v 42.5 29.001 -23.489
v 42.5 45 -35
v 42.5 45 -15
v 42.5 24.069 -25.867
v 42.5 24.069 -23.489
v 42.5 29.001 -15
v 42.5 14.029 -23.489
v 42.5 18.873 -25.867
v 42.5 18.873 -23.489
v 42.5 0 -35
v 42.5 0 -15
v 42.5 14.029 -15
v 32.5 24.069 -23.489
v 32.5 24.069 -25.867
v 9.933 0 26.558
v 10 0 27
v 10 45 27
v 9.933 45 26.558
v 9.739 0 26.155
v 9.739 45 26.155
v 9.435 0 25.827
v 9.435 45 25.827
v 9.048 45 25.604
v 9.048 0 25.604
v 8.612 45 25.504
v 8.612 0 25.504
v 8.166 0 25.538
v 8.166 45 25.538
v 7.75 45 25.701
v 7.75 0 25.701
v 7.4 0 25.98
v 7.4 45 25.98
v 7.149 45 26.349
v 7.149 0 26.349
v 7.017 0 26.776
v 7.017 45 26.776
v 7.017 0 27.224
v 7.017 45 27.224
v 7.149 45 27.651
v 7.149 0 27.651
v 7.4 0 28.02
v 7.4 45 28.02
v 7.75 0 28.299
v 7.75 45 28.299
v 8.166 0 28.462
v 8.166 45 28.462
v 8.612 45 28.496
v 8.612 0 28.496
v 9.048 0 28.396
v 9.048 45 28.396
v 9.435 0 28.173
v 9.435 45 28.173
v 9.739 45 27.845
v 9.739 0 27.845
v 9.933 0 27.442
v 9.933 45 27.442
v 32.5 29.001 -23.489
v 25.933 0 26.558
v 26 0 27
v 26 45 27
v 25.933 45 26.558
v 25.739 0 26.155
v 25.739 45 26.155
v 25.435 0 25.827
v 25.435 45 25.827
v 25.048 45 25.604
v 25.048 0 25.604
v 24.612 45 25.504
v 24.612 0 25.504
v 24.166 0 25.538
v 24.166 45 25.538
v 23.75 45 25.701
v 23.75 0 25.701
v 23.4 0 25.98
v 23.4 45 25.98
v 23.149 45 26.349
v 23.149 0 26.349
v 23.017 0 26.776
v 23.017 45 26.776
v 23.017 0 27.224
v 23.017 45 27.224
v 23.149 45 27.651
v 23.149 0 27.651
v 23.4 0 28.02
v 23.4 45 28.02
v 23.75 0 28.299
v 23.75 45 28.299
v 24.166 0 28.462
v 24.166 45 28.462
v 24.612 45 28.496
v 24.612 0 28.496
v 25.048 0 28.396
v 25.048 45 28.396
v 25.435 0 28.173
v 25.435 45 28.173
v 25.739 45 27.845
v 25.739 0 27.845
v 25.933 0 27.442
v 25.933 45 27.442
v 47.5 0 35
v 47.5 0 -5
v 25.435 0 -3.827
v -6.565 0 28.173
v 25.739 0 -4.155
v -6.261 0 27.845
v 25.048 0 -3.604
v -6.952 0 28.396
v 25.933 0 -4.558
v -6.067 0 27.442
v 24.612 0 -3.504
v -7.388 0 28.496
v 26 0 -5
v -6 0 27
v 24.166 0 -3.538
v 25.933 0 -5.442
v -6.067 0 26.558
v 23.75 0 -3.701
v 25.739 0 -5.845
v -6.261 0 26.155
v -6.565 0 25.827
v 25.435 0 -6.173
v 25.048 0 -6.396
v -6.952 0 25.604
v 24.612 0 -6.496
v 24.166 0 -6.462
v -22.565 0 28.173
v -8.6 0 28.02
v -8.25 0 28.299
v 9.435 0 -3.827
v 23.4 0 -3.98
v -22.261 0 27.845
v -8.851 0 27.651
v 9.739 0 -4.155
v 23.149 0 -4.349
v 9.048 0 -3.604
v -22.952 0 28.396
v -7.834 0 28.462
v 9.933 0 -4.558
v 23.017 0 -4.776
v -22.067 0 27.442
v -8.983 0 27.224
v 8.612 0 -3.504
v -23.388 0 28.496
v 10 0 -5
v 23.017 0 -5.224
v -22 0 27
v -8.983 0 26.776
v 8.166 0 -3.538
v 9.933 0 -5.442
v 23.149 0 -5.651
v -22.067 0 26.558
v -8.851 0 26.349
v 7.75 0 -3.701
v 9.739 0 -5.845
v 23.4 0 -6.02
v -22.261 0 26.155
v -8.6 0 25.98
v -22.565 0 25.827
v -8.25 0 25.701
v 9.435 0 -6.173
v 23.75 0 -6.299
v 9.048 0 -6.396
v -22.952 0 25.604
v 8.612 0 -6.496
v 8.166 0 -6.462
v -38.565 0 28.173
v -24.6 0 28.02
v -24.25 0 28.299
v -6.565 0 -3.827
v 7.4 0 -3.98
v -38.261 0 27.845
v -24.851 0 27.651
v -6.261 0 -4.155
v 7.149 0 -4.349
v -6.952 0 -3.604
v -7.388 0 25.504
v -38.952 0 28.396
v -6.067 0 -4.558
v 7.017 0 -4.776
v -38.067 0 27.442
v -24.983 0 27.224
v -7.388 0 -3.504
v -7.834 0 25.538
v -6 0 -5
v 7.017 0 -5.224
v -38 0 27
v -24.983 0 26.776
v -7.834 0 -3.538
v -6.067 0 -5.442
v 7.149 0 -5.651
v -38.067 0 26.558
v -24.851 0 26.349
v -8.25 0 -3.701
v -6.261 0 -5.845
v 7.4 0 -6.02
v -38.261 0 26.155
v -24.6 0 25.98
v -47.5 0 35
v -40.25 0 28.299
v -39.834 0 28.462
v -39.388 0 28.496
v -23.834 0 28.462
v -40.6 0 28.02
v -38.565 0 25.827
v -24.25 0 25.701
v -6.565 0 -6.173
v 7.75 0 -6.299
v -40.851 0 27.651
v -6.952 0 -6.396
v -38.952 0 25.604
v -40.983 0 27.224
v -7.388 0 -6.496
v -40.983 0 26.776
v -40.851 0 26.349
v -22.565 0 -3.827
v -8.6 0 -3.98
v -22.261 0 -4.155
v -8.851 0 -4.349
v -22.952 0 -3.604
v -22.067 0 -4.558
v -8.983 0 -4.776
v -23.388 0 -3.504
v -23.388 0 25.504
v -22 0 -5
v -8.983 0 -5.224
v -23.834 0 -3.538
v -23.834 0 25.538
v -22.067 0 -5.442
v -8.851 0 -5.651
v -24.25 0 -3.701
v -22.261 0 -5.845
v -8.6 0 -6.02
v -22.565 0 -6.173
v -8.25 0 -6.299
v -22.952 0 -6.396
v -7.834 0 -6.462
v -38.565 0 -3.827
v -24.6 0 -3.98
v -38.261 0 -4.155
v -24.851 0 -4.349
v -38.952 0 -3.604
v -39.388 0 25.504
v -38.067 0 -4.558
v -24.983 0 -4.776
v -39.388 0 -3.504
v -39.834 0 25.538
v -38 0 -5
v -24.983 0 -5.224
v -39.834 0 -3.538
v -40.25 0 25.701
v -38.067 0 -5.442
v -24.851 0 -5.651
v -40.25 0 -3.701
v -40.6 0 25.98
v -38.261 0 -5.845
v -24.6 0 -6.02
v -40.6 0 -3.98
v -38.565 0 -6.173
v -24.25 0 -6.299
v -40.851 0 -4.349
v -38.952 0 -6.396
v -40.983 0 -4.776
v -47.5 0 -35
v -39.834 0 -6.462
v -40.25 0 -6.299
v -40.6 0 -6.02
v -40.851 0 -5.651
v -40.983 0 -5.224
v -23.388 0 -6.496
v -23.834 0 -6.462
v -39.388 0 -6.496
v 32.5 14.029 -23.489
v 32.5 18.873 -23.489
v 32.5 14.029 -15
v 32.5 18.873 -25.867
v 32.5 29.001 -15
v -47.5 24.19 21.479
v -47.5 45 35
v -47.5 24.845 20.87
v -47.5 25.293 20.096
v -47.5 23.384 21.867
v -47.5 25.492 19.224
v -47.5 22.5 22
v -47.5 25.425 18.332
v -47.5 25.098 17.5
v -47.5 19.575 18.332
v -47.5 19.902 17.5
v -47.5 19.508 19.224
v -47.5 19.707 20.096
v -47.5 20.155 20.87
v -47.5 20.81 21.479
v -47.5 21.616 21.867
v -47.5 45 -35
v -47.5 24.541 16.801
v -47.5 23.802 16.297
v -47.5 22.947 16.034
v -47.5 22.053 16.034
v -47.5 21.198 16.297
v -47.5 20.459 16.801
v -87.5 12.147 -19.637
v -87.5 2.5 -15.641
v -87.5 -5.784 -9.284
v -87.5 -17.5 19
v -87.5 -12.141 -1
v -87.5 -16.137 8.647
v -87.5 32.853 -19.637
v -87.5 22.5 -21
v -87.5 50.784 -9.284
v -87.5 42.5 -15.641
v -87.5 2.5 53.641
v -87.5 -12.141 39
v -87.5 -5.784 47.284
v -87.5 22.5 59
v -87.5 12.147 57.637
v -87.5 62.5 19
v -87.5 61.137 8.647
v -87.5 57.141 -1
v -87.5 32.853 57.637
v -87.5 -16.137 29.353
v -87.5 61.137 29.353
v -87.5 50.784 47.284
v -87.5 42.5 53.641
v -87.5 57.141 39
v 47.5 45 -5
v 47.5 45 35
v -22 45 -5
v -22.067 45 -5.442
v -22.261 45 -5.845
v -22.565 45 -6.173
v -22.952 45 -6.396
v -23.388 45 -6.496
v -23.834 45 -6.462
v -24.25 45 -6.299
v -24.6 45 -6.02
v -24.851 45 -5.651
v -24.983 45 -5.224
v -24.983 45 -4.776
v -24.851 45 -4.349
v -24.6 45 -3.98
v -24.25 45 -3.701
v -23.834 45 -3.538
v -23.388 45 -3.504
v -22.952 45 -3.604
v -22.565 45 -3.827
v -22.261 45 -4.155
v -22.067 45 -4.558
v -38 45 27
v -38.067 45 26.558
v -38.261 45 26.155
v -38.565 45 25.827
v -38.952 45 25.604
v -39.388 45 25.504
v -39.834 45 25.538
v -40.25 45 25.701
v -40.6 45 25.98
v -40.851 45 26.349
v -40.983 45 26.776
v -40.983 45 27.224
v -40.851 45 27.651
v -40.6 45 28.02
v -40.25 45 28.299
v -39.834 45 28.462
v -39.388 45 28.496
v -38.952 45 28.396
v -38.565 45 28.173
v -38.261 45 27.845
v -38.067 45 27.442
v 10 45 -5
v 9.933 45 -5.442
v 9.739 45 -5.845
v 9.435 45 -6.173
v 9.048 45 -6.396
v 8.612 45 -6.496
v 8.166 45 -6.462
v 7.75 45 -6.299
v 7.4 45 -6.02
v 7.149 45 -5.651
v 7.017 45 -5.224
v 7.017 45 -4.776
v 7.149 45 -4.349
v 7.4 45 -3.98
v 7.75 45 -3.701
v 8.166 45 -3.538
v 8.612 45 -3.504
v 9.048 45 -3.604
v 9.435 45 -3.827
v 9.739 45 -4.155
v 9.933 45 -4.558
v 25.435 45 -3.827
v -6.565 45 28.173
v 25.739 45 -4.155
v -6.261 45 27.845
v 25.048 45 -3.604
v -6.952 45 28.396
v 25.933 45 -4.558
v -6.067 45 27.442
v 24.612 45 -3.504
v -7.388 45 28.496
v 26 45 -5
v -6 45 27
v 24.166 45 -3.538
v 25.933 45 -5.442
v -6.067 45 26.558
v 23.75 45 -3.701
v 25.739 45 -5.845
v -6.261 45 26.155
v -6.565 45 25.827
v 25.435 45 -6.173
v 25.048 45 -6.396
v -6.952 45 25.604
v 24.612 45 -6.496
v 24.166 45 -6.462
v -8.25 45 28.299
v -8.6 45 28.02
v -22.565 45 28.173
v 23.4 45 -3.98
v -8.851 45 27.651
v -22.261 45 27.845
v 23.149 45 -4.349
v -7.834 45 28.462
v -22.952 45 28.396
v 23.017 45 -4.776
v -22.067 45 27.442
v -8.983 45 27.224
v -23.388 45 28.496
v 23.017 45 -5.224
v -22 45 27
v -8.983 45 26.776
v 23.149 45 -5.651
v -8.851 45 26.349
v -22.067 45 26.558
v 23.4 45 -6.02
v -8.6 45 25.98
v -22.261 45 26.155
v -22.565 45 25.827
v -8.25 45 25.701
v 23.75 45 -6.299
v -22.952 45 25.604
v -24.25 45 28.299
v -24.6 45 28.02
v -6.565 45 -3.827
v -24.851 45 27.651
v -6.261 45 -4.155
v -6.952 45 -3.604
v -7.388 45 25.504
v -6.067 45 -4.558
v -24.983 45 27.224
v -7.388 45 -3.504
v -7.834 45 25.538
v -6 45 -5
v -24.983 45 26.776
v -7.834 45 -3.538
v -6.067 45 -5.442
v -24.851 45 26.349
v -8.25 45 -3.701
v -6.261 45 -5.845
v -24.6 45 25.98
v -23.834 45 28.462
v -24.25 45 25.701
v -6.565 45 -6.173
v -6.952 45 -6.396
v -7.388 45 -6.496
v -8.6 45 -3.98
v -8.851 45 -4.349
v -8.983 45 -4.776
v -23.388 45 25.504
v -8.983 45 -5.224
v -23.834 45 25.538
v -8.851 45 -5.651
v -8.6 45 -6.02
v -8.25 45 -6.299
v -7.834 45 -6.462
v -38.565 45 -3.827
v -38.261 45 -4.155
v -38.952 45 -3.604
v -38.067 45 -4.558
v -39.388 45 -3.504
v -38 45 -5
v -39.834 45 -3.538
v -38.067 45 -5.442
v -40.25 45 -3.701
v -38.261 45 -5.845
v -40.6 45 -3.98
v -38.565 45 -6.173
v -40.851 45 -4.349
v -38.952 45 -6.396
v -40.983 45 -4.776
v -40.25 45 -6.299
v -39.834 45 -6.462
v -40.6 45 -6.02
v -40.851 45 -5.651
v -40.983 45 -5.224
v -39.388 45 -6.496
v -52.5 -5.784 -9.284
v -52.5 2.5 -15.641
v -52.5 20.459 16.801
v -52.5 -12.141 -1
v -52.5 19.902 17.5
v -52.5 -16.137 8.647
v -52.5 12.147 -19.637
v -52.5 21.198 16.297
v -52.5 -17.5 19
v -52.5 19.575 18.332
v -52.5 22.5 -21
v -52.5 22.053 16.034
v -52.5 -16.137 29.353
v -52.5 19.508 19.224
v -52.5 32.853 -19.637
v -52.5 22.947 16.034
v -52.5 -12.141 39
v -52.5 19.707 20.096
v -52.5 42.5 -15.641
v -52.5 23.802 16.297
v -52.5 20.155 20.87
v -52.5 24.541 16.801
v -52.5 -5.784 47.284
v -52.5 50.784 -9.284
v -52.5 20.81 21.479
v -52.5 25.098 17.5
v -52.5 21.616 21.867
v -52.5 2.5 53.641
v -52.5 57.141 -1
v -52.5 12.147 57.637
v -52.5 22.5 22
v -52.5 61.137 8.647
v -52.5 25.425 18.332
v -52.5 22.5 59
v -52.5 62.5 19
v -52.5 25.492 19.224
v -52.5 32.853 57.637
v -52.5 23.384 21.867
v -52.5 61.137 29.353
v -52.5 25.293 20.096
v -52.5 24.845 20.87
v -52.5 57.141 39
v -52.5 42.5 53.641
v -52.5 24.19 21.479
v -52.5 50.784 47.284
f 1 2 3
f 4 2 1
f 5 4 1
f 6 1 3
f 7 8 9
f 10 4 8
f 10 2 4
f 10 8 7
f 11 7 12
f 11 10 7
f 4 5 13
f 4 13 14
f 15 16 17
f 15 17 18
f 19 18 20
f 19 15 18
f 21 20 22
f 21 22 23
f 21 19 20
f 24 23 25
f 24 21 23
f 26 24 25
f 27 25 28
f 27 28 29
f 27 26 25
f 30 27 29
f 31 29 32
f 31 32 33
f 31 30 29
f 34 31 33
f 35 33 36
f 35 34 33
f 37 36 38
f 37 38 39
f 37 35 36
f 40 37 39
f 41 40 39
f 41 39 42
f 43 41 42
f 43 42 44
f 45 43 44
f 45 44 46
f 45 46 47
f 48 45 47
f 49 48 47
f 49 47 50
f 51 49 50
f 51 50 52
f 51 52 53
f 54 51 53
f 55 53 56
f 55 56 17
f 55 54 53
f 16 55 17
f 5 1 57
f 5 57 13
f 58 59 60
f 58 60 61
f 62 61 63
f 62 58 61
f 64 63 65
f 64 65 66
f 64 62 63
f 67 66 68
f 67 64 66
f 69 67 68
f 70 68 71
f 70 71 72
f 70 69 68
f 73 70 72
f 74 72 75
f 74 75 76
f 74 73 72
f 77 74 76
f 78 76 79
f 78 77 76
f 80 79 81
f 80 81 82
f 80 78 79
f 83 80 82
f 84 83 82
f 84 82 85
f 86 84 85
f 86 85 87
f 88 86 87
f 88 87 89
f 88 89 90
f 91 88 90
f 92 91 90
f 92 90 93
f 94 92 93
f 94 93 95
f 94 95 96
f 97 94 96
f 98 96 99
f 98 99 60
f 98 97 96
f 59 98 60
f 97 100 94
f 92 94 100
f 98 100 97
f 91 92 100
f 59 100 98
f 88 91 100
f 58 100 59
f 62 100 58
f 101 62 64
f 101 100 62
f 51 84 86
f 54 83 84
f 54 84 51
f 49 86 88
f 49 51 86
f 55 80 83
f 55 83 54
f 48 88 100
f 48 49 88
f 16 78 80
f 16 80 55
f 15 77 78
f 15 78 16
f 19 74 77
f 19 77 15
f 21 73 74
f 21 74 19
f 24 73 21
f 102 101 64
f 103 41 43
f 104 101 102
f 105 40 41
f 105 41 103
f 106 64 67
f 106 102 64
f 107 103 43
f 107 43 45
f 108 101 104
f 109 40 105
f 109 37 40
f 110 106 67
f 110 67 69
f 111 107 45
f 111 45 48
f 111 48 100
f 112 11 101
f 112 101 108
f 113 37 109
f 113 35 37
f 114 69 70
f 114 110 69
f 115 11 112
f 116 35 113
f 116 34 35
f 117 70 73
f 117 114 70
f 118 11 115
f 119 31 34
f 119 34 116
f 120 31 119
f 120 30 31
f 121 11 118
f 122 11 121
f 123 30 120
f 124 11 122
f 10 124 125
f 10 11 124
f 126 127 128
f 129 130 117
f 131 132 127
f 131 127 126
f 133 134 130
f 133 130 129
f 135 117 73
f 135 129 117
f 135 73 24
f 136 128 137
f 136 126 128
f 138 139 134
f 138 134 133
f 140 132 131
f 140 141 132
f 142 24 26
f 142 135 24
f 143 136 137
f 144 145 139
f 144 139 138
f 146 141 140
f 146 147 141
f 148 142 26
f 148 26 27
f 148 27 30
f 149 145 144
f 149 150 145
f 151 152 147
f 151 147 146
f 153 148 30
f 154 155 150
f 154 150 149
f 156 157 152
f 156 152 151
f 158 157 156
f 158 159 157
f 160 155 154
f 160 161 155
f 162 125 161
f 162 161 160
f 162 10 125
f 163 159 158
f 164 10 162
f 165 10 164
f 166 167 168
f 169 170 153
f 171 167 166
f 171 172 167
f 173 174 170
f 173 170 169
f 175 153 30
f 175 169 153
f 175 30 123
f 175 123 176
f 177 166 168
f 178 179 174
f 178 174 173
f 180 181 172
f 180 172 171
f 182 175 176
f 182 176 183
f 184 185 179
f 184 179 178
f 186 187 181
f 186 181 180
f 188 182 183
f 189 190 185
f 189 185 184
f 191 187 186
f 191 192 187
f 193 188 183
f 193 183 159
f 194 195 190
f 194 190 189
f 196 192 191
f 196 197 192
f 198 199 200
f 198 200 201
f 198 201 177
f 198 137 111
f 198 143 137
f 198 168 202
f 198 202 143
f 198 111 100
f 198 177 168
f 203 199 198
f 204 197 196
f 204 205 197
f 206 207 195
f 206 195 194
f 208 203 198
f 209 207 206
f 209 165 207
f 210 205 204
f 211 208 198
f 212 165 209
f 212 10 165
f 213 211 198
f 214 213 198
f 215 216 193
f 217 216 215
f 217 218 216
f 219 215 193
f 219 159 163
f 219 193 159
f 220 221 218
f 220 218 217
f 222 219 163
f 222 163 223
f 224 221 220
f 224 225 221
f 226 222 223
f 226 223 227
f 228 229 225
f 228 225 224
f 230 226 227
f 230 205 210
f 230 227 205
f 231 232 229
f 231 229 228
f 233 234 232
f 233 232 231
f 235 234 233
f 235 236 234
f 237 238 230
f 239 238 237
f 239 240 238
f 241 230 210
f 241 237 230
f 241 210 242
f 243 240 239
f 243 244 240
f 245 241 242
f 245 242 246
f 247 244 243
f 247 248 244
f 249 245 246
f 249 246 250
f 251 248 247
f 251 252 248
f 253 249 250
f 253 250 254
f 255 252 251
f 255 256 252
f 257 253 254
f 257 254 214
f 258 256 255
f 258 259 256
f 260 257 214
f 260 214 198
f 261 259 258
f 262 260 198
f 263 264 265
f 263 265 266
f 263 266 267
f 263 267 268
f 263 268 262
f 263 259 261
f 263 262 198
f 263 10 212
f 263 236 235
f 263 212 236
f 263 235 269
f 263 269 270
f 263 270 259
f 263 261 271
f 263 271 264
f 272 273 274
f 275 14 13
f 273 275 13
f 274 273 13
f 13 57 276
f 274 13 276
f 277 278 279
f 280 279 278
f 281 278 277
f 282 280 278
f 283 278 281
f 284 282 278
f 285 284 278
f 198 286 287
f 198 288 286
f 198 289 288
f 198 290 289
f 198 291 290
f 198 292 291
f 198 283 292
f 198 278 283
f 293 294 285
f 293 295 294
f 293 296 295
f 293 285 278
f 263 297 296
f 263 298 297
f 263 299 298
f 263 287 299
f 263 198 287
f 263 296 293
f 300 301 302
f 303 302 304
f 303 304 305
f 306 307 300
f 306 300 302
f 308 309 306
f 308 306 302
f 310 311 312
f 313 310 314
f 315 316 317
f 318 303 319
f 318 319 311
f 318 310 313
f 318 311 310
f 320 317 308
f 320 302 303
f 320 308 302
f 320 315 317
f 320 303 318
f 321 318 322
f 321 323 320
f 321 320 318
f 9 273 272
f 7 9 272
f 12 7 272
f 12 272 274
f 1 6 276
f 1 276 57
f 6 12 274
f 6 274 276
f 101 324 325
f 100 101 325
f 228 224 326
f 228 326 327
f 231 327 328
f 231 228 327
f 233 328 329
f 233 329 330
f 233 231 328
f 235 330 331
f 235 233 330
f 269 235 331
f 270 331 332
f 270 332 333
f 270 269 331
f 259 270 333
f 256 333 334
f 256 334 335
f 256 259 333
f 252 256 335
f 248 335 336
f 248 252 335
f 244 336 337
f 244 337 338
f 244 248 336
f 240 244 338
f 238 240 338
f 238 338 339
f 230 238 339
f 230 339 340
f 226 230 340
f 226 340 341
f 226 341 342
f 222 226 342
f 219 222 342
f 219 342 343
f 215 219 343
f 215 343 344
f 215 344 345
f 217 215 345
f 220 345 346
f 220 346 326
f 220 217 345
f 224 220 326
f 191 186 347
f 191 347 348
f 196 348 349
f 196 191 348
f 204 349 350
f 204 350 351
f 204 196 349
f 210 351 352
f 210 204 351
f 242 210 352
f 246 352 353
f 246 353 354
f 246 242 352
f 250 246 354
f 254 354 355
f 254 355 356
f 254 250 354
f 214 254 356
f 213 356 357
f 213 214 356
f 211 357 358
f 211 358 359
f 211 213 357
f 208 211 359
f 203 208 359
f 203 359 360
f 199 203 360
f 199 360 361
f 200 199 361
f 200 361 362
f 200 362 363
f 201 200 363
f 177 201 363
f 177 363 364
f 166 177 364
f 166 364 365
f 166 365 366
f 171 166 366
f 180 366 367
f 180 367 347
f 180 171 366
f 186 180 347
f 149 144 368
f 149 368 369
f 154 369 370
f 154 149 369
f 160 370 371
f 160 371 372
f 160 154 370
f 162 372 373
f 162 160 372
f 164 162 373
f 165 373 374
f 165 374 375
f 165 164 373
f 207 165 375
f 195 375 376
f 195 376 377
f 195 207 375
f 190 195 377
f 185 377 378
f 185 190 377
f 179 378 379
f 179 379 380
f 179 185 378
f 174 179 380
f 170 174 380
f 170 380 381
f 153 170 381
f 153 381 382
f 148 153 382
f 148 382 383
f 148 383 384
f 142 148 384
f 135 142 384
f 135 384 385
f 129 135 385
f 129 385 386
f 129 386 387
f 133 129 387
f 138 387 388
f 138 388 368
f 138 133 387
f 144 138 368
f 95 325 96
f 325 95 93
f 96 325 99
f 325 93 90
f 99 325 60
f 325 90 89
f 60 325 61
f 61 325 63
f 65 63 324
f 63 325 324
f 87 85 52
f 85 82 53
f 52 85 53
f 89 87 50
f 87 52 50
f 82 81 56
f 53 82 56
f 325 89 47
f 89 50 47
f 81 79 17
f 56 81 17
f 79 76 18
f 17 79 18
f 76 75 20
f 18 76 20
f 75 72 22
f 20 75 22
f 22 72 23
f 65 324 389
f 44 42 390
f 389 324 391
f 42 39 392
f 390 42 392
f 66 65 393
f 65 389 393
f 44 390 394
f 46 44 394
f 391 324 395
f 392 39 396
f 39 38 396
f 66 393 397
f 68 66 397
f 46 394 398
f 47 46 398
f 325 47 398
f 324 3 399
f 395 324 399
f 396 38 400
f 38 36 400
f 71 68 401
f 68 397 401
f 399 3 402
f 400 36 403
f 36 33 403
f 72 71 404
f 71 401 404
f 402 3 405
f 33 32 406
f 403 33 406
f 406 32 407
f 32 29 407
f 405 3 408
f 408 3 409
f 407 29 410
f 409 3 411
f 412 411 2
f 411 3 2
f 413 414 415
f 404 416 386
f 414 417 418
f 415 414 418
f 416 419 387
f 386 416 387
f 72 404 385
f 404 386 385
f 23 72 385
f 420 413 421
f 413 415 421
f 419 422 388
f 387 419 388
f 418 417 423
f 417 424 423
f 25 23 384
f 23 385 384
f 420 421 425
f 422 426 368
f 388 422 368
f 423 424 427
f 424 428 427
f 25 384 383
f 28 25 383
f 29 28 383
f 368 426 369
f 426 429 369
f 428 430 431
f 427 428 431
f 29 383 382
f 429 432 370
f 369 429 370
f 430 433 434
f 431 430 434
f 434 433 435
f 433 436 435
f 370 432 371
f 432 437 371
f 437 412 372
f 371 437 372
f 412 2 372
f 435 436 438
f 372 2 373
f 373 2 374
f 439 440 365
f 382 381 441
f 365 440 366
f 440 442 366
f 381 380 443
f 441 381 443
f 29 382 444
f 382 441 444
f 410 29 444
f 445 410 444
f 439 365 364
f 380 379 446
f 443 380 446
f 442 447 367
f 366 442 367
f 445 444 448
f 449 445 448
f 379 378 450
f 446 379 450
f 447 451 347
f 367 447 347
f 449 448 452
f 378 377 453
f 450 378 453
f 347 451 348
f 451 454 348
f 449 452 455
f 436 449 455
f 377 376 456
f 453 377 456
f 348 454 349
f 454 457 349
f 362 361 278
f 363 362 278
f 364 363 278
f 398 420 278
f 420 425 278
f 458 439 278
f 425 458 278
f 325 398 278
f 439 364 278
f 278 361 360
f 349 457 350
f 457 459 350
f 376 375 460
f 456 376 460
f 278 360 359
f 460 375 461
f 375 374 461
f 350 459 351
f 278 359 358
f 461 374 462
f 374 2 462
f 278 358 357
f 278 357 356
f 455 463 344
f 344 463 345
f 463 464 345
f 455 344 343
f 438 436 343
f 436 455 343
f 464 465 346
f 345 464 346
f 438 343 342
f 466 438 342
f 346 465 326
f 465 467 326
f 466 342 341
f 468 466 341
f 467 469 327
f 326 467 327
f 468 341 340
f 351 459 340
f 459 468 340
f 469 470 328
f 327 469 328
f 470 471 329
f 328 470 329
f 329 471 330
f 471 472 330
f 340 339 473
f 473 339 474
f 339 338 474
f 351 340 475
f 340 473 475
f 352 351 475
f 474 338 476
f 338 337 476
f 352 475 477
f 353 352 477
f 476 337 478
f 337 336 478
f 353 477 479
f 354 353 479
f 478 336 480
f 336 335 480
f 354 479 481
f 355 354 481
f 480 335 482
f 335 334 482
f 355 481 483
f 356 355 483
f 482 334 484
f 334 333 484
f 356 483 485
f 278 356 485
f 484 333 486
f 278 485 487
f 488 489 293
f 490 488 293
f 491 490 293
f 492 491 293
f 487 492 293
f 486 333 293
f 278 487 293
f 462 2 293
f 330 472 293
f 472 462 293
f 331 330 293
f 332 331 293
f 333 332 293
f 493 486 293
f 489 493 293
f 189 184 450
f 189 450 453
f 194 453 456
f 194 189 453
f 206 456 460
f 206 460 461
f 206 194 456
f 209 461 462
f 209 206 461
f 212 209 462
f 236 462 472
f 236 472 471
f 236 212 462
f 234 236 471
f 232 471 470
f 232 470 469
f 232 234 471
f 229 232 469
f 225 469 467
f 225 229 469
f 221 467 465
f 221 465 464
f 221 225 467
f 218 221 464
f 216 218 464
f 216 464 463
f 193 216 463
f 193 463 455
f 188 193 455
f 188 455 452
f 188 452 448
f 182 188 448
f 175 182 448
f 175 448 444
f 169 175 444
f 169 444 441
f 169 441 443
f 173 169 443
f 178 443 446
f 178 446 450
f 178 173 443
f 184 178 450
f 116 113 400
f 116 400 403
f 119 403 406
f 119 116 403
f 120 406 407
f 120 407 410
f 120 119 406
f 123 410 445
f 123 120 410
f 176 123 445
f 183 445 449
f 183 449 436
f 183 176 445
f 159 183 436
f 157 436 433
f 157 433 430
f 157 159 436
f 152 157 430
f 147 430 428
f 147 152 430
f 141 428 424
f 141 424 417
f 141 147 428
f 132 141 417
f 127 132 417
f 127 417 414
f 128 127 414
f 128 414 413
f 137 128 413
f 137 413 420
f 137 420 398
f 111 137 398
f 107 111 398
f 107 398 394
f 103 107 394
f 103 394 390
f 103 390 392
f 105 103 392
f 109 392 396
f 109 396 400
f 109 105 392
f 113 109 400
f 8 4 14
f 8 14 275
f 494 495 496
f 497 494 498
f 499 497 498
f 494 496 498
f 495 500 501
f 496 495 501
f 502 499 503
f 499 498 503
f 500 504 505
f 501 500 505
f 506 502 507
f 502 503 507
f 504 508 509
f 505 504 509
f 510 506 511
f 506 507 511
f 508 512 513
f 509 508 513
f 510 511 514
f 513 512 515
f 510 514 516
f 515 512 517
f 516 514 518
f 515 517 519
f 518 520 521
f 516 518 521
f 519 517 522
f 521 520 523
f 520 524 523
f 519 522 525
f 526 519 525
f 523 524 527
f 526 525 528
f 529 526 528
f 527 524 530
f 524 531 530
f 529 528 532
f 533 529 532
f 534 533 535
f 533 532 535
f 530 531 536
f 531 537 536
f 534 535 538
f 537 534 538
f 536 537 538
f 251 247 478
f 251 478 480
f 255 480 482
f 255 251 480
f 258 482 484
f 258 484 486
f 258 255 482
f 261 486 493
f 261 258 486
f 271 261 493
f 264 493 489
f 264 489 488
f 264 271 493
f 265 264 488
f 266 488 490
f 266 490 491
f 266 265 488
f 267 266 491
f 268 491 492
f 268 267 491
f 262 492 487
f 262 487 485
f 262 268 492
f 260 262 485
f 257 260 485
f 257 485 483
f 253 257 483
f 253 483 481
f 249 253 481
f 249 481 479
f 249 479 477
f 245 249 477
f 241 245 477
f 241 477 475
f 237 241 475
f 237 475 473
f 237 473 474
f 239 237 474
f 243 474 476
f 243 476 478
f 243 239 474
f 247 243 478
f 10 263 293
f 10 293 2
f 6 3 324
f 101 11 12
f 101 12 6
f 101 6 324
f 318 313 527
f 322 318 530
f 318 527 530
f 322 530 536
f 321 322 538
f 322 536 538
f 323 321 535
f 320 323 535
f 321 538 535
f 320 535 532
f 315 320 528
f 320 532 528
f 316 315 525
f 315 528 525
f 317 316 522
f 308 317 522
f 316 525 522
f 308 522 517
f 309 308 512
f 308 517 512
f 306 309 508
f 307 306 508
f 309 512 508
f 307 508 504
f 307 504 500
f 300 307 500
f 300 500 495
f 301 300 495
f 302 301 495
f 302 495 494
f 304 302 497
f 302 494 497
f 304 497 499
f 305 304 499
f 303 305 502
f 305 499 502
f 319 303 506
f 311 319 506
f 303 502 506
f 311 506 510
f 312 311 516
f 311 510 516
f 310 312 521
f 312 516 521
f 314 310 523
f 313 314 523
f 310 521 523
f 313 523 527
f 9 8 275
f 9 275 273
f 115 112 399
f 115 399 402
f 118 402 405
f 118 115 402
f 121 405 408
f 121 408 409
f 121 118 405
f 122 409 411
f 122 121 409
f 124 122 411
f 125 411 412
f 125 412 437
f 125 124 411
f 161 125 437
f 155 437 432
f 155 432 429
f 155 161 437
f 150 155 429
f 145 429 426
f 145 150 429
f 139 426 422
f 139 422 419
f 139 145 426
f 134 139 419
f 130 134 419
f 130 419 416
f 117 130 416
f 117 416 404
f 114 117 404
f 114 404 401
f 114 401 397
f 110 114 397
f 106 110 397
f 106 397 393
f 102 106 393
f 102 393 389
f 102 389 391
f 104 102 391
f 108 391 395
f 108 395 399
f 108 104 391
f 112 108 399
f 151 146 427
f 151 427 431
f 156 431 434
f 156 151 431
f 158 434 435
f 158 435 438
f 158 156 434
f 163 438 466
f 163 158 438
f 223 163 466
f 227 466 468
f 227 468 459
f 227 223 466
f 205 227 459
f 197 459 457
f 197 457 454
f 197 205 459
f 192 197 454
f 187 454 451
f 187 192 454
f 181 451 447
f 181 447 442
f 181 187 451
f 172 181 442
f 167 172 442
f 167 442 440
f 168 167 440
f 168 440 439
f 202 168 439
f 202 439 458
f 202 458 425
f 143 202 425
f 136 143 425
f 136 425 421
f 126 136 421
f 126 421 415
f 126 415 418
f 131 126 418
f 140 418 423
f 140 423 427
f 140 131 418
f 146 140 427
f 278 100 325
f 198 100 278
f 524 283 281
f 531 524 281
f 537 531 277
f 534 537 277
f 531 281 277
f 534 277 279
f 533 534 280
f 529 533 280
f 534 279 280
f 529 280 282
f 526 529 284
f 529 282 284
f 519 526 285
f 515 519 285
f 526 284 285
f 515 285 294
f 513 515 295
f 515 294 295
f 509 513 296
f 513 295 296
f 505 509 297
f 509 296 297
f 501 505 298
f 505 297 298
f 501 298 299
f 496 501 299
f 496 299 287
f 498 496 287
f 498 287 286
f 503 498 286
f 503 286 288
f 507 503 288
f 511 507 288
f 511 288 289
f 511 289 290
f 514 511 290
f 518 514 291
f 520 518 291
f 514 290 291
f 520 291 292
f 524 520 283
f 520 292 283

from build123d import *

# Parameters (mm, degrees)
SKETCH_1_R          = 1.5
EXTRUDE_1_DEPTH     = 45
CUT_EXTRUDE_1_DEPTH = 10
SKETCH_3_R          = 3
EXTRUDE_2_DEPTH     = 5
SKETCH_4_R          = 40
EXTRUDE_3_DEPTH     = 35


with BuildPart() as part:
    # 草图1 → 凸台-拉伸1 (new body)
    with BuildSketch(Plane(origin=(0, 0, 0), x_dir=(1, 0, 0), z_dir=(0, 1, 0))):
        Polygon((42.5, 35), (42.5, 15), (47.5, 5), (47.5, -35), (-47.5, -35), (-47.5, 35), align=None)
        with Locations((-39.5, -27)):
            Circle(SKETCH_1_R, mode=Mode.SUBTRACT)
        with Locations((-23.5, -27)):
            Circle(SKETCH_1_R, mode=Mode.SUBTRACT)
        with Locations((-7.5, -27)):
            Circle(SKETCH_1_R, mode=Mode.SUBTRACT)
        with Locations((8.5, -27)):
            Circle(SKETCH_1_R, mode=Mode.SUBTRACT)
        with Locations((24.5, -27)):
            Circle(SKETCH_1_R, mode=Mode.SUBTRACT)
        with Locations((-23.5, 5)):
            Circle(SKETCH_1_R, mode=Mode.SUBTRACT)
        with Locations((-7.5, 5)):
            Circle(SKETCH_1_R, mode=Mode.SUBTRACT)
        with Locations((8.5, 5)):
            Circle(SKETCH_1_R, mode=Mode.SUBTRACT)
        with Locations((24.5, 5)):
            Circle(SKETCH_1_R, mode=Mode.SUBTRACT)
        with Locations((-39.5, 5)):
            Circle(SKETCH_1_R, mode=Mode.SUBTRACT)
    extrude(amount=EXTRUDE_1_DEPTH)

    # 草图2 → 切除-拉伸1 (cut)
    with BuildSketch(Plane(origin=(42.5, 0, 0), x_dir=(0, 0, -1), z_dir=(1, 0, 0))):
        Polygon((15, 29.001286667), (23.488716393, 29.001286667), (23.488716393, 24.069127899), (25.866721513, 24.069127899), (25.866721513, 18.87274634), (23.488716393, 18.87274634), (23.488716393, 14.028661836), (15, 14.028661836), align=None)
    extrude(amount=-CUT_EXTRUDE_1_DEPTH, mode=Mode.SUBTRACT)

    # 草图3 → 凸台-拉伸2 (add)
    with BuildSketch(Plane.ZY.offset(47.5)):
        with Locations((19, 22.5)):
            Circle(SKETCH_3_R)
    extrude(amount=EXTRUDE_2_DEPTH)

    # 草图4 → 凸台-拉伸3 (add)
    with BuildSketch(Plane.ZY.offset(52.5)):
        with Locations((19, 22.5)):
            Circle(SKETCH_4_R)
    extrude(amount=EXTRUDE_3_DEPTH)


solid = part.part
